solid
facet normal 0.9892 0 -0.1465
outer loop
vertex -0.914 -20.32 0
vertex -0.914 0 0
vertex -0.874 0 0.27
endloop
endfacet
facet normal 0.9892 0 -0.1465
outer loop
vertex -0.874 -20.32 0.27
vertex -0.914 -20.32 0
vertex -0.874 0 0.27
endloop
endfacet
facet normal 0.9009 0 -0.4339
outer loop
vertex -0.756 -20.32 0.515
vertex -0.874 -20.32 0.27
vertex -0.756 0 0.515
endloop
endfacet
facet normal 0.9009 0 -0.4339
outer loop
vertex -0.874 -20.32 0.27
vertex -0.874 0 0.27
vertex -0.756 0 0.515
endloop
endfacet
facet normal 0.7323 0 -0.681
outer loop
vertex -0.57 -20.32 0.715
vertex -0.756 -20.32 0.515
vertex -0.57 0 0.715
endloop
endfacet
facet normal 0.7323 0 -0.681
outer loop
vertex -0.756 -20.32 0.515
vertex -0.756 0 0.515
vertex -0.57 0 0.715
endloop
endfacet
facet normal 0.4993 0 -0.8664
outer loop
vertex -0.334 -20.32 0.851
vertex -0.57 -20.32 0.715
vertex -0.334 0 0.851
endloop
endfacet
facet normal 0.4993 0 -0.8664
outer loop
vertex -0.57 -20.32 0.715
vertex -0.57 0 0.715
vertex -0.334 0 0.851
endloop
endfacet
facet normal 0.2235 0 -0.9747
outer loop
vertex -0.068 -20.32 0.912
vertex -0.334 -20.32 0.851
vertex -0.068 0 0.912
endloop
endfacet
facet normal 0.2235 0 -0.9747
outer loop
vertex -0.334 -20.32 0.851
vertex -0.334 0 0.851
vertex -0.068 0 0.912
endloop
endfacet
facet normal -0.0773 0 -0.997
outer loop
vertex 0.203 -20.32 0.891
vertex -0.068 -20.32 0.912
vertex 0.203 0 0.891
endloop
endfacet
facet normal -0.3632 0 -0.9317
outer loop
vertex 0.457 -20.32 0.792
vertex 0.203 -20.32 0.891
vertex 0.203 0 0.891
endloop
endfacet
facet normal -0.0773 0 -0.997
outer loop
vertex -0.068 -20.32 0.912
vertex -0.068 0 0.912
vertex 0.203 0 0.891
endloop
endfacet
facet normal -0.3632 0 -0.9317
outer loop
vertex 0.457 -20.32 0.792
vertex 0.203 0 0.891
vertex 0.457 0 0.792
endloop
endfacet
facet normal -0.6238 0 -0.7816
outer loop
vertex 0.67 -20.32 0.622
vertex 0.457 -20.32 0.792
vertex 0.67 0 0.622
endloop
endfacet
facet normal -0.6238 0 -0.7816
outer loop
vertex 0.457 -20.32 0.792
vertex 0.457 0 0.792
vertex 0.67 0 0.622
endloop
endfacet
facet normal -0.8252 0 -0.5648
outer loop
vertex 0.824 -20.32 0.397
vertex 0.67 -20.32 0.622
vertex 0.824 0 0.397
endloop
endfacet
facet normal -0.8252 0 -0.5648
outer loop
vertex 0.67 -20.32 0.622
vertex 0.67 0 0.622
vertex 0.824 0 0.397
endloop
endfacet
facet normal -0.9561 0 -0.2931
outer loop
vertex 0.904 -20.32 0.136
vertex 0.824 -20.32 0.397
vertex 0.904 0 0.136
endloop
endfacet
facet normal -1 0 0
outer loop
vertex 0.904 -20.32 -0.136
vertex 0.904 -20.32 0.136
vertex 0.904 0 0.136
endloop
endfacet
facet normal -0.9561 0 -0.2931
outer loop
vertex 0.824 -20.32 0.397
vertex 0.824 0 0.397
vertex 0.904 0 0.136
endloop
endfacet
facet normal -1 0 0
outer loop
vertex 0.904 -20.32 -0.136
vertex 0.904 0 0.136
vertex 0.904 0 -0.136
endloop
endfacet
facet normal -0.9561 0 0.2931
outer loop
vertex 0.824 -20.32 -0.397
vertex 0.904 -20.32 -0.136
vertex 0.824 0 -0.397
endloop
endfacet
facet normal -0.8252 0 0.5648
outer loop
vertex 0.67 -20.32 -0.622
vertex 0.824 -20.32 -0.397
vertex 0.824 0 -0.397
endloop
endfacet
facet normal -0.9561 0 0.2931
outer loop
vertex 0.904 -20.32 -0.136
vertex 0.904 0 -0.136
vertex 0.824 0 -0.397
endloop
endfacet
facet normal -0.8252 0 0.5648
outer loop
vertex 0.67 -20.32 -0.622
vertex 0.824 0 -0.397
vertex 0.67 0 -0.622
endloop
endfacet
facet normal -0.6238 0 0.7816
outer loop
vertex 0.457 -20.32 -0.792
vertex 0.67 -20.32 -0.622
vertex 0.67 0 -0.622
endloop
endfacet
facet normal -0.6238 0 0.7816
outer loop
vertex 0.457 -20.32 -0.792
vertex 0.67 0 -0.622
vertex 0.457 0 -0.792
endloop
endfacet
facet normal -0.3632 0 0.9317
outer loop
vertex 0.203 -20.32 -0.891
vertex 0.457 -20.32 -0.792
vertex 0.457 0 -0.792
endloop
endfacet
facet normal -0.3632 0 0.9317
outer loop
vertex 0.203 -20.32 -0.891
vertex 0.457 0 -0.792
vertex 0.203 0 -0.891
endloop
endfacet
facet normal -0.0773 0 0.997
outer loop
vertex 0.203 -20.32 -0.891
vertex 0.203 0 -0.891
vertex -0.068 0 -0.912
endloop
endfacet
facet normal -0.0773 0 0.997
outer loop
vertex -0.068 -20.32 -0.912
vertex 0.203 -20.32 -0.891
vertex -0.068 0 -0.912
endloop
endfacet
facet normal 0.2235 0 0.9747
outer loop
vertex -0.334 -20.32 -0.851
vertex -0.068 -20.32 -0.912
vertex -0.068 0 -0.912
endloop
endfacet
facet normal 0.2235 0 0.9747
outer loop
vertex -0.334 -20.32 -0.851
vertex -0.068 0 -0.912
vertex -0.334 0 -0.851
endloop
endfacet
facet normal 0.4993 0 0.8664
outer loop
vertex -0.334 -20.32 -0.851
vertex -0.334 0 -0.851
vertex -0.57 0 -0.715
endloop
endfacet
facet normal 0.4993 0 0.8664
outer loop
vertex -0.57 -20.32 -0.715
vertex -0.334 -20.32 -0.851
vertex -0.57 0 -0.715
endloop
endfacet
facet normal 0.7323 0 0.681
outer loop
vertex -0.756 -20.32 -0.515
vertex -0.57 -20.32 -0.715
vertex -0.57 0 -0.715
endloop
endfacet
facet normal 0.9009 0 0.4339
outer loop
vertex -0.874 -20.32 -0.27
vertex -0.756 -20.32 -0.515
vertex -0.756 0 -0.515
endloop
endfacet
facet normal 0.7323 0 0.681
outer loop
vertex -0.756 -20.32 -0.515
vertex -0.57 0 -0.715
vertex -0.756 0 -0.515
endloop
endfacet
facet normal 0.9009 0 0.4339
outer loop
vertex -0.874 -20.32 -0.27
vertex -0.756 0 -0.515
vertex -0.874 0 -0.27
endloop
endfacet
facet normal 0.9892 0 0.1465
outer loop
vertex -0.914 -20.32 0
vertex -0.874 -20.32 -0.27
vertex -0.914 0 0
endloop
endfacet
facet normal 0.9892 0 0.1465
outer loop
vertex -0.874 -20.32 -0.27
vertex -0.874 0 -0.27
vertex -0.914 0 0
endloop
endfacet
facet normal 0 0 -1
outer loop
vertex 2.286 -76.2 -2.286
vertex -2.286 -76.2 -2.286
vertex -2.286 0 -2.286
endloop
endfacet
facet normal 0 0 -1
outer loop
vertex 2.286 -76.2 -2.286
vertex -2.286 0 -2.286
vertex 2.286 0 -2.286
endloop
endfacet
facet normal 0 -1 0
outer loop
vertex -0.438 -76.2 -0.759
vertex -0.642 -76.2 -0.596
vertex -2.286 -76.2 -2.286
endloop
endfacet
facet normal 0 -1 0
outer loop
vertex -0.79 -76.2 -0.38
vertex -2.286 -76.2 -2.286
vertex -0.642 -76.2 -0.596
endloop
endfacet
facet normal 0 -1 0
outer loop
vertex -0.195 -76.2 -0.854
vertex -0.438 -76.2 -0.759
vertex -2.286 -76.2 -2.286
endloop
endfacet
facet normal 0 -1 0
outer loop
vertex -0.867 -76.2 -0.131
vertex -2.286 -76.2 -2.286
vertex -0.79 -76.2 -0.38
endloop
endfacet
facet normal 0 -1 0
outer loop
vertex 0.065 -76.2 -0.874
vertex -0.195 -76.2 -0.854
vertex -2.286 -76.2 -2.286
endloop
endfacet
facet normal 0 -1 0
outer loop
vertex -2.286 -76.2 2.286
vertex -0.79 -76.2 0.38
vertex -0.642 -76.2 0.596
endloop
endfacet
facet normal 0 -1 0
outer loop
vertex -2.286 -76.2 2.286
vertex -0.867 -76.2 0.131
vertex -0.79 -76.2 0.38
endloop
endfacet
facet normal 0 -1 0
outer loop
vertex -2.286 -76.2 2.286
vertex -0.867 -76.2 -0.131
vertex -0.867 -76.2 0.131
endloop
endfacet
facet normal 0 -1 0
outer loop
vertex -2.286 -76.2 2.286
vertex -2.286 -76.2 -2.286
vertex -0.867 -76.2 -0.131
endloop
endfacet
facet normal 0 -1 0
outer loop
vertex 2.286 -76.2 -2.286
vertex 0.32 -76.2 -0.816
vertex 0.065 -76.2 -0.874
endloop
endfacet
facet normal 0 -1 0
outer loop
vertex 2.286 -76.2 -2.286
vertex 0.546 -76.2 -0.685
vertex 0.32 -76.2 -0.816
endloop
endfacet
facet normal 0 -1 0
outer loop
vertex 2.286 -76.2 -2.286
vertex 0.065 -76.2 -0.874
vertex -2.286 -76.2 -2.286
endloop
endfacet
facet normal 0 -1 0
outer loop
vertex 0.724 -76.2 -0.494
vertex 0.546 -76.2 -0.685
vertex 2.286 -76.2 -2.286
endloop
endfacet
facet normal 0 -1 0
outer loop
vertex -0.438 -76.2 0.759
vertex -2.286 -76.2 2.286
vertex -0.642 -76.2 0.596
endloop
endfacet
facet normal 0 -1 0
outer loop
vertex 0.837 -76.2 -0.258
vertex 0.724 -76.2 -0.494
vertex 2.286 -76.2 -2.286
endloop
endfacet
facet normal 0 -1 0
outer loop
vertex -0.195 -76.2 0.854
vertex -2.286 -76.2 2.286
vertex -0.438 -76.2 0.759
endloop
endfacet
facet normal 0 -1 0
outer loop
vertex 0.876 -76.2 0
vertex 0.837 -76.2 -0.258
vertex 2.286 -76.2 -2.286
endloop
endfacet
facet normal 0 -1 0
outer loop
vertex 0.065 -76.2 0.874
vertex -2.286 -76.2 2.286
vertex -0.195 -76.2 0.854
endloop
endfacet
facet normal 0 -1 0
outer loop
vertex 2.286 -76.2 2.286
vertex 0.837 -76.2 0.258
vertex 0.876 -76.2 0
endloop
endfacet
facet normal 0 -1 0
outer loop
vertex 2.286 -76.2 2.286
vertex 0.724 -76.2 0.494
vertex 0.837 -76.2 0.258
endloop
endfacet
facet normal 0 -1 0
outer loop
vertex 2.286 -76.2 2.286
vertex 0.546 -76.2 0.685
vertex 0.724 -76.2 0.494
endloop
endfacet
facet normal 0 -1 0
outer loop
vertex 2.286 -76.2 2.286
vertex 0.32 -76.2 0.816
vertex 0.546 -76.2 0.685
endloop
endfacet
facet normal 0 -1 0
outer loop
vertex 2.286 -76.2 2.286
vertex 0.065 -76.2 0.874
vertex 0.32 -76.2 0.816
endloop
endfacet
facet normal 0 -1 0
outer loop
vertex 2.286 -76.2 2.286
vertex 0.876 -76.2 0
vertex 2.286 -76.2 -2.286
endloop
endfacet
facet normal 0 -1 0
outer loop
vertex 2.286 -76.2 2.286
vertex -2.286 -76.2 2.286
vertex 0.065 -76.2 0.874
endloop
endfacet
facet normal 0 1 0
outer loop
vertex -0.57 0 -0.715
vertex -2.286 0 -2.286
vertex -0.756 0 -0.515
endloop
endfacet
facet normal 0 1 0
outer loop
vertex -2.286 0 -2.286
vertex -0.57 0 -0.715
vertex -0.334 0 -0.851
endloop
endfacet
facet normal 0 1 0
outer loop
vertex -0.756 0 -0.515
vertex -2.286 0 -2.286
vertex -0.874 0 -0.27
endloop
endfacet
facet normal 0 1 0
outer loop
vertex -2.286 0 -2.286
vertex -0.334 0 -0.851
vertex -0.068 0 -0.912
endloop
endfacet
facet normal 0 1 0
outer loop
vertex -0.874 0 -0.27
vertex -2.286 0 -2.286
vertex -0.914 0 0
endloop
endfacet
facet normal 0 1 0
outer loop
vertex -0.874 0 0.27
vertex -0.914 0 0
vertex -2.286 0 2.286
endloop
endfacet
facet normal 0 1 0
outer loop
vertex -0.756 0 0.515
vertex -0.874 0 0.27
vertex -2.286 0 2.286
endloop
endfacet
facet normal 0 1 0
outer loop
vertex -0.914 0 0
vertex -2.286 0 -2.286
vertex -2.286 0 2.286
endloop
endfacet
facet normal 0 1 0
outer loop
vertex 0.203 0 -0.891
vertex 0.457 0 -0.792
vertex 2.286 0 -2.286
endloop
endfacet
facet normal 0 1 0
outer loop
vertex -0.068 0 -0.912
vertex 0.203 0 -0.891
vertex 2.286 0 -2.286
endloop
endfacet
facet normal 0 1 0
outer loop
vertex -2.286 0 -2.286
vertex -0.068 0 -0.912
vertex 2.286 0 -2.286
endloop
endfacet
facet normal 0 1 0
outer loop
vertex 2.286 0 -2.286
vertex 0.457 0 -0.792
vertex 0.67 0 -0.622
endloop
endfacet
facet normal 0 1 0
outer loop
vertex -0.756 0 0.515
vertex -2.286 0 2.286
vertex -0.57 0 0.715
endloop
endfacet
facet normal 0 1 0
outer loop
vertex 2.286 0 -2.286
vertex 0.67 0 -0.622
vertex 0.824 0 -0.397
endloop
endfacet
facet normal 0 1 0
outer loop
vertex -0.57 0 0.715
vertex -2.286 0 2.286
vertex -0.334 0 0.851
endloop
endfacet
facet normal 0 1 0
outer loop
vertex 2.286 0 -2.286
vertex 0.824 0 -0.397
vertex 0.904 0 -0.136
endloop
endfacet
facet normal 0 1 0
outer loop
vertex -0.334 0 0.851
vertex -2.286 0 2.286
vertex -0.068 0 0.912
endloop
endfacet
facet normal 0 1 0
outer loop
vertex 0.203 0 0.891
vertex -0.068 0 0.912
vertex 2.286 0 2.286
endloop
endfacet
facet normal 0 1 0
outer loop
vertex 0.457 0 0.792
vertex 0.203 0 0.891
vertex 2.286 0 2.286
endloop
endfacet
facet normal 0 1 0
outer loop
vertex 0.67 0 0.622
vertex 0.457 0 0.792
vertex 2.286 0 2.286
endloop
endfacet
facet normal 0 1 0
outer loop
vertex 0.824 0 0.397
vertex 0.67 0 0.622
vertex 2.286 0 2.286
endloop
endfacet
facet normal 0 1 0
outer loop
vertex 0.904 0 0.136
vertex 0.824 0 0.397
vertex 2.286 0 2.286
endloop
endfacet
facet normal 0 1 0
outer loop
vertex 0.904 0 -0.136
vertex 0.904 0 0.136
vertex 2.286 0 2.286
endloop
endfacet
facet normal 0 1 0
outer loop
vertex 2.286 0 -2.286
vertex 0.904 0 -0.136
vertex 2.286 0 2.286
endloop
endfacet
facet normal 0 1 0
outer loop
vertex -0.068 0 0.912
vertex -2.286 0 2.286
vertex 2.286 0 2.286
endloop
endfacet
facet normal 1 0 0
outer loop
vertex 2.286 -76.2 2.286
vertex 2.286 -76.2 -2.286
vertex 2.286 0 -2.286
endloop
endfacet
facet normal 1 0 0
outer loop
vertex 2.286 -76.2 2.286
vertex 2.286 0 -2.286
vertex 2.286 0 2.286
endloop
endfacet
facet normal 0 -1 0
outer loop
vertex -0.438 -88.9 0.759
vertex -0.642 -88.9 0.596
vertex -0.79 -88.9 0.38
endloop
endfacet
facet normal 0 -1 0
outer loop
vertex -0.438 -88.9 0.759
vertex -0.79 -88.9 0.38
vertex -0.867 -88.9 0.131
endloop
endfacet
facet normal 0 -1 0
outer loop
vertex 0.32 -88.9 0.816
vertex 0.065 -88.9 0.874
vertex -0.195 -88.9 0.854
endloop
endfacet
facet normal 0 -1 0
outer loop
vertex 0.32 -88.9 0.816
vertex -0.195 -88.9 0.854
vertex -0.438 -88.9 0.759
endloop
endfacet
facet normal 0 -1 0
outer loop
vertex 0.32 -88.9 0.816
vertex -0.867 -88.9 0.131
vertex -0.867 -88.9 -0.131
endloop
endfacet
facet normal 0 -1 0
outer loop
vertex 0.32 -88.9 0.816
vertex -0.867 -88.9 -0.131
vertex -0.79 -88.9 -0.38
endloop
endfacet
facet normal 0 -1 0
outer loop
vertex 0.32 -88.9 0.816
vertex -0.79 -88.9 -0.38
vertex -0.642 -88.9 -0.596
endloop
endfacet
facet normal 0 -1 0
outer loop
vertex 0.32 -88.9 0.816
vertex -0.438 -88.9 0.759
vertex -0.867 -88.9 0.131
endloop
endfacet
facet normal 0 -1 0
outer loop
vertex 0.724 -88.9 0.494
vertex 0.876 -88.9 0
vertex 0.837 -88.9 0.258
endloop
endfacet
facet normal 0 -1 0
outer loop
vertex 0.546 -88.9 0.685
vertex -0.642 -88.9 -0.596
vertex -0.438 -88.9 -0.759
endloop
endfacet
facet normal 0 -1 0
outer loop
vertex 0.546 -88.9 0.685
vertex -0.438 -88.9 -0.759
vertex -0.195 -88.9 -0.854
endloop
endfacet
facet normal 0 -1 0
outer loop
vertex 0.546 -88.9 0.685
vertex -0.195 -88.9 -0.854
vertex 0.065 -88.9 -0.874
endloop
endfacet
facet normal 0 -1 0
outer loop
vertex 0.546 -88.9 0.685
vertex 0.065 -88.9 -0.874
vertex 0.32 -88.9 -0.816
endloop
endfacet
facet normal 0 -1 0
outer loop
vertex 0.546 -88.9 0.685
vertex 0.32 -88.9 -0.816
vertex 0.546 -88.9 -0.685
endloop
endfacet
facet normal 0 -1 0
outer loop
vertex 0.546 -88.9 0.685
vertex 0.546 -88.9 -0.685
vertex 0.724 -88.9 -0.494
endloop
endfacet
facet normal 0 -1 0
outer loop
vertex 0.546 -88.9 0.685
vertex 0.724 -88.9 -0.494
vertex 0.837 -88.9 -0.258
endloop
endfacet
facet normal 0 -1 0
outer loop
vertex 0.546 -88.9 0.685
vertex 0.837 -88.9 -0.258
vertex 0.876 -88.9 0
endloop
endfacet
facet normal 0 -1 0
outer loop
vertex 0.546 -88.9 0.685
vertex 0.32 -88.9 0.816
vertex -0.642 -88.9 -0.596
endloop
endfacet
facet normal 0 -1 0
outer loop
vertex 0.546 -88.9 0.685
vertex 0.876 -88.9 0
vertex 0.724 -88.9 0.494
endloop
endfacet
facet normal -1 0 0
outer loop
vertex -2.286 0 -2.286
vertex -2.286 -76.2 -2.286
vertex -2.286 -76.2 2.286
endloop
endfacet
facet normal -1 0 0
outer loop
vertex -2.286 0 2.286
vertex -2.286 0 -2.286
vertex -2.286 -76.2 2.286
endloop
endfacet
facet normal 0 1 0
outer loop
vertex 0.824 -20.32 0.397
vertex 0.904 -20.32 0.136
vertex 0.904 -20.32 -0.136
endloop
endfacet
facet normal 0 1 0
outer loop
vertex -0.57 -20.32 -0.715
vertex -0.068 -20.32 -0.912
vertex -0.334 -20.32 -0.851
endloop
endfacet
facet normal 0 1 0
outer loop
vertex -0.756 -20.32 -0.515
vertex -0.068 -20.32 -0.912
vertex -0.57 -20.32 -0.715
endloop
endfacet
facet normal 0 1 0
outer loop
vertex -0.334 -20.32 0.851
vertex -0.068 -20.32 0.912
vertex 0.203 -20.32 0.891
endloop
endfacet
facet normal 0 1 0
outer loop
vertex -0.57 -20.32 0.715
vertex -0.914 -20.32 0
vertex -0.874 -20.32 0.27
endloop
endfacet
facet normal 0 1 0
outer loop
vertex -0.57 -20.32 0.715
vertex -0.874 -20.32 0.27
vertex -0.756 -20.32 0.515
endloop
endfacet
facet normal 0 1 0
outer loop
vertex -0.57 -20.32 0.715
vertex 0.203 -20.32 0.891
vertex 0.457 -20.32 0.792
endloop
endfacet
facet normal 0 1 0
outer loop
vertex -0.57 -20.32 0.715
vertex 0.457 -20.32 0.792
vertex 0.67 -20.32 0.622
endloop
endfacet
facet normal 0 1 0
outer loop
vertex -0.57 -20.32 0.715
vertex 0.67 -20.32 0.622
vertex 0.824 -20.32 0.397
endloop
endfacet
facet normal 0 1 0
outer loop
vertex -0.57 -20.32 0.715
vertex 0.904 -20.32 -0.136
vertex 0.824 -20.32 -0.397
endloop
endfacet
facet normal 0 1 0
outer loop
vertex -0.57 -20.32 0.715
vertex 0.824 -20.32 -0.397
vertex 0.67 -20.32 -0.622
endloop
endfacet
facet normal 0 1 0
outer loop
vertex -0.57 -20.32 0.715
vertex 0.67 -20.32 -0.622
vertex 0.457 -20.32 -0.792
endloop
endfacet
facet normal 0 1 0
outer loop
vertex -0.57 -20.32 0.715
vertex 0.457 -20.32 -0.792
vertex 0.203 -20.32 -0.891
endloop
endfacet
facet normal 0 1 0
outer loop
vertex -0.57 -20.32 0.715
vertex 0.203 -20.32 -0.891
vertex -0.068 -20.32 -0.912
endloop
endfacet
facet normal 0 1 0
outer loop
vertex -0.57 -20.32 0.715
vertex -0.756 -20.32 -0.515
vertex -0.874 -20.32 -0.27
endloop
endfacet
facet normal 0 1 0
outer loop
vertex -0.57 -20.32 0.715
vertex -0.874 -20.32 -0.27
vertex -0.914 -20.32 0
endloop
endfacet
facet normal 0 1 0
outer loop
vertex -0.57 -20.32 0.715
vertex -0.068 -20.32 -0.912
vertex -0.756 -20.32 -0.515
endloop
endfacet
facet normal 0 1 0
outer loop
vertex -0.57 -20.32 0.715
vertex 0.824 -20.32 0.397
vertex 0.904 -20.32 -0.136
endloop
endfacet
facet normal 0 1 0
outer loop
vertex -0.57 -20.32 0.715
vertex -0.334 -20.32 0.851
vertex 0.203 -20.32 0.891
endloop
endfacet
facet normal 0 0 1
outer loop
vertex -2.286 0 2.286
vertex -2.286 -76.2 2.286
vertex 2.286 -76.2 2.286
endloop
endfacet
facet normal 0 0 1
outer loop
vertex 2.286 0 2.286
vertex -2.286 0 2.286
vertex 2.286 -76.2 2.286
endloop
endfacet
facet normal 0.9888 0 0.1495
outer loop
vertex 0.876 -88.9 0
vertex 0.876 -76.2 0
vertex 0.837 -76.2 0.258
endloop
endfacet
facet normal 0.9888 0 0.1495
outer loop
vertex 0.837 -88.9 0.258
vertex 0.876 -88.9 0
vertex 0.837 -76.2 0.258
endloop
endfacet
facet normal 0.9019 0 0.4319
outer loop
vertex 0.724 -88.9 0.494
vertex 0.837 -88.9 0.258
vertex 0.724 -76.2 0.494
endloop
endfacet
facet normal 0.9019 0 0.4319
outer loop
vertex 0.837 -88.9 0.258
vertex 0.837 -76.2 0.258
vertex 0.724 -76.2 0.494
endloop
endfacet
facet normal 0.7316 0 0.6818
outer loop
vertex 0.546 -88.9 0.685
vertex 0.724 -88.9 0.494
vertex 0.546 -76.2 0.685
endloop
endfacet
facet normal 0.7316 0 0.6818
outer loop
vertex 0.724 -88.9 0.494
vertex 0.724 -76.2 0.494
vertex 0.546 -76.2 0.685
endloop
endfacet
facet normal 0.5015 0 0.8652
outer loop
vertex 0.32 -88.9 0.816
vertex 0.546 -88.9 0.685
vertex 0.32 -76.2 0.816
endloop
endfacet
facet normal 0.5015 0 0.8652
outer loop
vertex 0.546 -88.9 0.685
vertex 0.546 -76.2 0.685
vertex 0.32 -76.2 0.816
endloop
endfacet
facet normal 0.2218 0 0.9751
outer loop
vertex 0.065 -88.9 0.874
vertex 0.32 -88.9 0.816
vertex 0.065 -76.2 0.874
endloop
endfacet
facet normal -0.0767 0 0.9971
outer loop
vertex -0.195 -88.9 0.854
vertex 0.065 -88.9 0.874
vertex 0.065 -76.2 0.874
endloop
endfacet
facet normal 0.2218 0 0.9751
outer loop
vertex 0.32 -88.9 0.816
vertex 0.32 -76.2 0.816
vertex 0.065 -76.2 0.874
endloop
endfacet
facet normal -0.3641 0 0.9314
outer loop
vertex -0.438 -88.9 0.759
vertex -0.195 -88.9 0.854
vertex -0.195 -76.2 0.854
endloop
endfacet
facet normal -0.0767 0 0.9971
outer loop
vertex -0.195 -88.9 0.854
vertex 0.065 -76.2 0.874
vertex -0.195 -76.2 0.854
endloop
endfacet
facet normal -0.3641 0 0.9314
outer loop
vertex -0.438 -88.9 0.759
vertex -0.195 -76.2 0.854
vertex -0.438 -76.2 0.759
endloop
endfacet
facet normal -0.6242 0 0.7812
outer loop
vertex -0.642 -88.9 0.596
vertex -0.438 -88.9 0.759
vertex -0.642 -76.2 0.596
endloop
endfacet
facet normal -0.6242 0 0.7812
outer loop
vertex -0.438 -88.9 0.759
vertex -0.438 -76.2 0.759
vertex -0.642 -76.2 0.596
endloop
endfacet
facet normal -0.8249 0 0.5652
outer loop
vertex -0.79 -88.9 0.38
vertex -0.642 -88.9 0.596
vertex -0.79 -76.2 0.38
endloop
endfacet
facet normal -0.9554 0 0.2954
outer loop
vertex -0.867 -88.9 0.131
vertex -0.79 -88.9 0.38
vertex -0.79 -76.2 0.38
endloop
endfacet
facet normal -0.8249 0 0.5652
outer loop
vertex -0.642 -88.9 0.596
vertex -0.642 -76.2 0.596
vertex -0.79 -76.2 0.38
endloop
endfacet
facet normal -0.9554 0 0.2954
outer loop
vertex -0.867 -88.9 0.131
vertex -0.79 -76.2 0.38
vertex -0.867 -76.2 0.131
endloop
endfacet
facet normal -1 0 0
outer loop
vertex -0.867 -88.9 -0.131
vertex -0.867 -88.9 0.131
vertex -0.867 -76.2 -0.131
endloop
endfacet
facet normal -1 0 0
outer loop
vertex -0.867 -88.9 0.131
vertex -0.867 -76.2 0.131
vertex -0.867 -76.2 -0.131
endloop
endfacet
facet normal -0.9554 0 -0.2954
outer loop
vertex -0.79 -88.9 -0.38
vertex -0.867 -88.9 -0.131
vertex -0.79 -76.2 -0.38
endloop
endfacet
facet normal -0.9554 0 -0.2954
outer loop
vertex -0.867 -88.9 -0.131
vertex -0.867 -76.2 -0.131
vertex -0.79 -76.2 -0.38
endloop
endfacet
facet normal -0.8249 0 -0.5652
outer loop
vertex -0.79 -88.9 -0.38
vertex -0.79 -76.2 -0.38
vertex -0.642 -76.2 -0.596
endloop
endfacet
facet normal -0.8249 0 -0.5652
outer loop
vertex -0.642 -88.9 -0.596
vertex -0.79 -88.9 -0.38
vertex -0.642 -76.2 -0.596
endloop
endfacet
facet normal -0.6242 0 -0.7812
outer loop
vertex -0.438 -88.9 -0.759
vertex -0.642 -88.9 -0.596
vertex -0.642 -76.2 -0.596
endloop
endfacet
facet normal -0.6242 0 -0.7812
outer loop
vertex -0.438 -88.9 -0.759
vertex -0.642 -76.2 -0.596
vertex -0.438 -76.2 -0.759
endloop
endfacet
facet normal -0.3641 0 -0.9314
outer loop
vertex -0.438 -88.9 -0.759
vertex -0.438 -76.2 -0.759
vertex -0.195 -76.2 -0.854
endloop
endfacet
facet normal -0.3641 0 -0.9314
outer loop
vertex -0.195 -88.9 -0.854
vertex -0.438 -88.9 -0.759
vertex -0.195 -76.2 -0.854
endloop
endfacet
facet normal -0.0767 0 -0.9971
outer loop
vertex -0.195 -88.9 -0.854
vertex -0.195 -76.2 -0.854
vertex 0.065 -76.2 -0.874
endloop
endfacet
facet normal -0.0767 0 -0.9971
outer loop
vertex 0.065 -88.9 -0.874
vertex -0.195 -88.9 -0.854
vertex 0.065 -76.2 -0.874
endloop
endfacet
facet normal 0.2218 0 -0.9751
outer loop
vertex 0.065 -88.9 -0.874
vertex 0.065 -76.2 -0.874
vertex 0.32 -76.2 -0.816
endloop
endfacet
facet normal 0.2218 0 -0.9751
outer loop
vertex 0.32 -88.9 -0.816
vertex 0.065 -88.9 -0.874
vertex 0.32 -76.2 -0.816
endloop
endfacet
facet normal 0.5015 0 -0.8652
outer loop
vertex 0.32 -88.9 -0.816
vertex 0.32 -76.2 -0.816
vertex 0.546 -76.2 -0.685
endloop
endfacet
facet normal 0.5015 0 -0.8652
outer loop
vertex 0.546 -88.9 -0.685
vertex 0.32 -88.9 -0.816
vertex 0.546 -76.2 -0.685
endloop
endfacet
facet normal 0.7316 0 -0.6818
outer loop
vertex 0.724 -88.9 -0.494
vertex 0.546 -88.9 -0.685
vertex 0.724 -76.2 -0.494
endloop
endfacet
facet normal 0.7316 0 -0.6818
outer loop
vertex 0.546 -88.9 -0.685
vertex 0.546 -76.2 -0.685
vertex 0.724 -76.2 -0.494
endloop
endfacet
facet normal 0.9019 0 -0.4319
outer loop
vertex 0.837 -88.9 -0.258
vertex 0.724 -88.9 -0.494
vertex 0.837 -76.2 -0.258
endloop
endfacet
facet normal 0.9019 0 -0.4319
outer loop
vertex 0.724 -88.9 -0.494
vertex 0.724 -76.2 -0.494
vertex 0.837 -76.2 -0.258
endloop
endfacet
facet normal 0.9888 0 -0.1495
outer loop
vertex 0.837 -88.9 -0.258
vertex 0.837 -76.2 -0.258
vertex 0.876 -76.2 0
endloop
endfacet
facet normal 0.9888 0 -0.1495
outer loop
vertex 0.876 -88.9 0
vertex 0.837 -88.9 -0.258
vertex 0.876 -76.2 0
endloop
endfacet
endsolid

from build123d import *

# Parameters (mm, degrees)
F0_W     = 4.572
F0_H     = 4.572
F1_DEPTH = 76.2
F2_R     = 0.8763
F3_DEPTH = 12.7
F4_R     = 0.9144
F5_DEPTH = 20.32


with BuildPart() as f1:
    # F0 (on Front) → F1 (new body)
    with BuildSketch(Plane.XZ):
        Rectangle(F0_W, F0_H)
    extrude(amount=F1_DEPTH)

    # F2 (on face) → F3 (join)
    with BuildSketch(Plane.XZ.offset(76.2)):
        Circle(F2_R)
    extrude(amount=F3_DEPTH)

    # F4 (on face) → F5 (cut)
    with BuildSketch(Plane(origin=(0, 0, 0), x_dir=(-1, 0, 0), z_dir=(0, 1, 0))):
        Circle(F4_R)
    extrude(amount=-F5_DEPTH, mode=Mode.SUBTRACT)


solid = f1.part
